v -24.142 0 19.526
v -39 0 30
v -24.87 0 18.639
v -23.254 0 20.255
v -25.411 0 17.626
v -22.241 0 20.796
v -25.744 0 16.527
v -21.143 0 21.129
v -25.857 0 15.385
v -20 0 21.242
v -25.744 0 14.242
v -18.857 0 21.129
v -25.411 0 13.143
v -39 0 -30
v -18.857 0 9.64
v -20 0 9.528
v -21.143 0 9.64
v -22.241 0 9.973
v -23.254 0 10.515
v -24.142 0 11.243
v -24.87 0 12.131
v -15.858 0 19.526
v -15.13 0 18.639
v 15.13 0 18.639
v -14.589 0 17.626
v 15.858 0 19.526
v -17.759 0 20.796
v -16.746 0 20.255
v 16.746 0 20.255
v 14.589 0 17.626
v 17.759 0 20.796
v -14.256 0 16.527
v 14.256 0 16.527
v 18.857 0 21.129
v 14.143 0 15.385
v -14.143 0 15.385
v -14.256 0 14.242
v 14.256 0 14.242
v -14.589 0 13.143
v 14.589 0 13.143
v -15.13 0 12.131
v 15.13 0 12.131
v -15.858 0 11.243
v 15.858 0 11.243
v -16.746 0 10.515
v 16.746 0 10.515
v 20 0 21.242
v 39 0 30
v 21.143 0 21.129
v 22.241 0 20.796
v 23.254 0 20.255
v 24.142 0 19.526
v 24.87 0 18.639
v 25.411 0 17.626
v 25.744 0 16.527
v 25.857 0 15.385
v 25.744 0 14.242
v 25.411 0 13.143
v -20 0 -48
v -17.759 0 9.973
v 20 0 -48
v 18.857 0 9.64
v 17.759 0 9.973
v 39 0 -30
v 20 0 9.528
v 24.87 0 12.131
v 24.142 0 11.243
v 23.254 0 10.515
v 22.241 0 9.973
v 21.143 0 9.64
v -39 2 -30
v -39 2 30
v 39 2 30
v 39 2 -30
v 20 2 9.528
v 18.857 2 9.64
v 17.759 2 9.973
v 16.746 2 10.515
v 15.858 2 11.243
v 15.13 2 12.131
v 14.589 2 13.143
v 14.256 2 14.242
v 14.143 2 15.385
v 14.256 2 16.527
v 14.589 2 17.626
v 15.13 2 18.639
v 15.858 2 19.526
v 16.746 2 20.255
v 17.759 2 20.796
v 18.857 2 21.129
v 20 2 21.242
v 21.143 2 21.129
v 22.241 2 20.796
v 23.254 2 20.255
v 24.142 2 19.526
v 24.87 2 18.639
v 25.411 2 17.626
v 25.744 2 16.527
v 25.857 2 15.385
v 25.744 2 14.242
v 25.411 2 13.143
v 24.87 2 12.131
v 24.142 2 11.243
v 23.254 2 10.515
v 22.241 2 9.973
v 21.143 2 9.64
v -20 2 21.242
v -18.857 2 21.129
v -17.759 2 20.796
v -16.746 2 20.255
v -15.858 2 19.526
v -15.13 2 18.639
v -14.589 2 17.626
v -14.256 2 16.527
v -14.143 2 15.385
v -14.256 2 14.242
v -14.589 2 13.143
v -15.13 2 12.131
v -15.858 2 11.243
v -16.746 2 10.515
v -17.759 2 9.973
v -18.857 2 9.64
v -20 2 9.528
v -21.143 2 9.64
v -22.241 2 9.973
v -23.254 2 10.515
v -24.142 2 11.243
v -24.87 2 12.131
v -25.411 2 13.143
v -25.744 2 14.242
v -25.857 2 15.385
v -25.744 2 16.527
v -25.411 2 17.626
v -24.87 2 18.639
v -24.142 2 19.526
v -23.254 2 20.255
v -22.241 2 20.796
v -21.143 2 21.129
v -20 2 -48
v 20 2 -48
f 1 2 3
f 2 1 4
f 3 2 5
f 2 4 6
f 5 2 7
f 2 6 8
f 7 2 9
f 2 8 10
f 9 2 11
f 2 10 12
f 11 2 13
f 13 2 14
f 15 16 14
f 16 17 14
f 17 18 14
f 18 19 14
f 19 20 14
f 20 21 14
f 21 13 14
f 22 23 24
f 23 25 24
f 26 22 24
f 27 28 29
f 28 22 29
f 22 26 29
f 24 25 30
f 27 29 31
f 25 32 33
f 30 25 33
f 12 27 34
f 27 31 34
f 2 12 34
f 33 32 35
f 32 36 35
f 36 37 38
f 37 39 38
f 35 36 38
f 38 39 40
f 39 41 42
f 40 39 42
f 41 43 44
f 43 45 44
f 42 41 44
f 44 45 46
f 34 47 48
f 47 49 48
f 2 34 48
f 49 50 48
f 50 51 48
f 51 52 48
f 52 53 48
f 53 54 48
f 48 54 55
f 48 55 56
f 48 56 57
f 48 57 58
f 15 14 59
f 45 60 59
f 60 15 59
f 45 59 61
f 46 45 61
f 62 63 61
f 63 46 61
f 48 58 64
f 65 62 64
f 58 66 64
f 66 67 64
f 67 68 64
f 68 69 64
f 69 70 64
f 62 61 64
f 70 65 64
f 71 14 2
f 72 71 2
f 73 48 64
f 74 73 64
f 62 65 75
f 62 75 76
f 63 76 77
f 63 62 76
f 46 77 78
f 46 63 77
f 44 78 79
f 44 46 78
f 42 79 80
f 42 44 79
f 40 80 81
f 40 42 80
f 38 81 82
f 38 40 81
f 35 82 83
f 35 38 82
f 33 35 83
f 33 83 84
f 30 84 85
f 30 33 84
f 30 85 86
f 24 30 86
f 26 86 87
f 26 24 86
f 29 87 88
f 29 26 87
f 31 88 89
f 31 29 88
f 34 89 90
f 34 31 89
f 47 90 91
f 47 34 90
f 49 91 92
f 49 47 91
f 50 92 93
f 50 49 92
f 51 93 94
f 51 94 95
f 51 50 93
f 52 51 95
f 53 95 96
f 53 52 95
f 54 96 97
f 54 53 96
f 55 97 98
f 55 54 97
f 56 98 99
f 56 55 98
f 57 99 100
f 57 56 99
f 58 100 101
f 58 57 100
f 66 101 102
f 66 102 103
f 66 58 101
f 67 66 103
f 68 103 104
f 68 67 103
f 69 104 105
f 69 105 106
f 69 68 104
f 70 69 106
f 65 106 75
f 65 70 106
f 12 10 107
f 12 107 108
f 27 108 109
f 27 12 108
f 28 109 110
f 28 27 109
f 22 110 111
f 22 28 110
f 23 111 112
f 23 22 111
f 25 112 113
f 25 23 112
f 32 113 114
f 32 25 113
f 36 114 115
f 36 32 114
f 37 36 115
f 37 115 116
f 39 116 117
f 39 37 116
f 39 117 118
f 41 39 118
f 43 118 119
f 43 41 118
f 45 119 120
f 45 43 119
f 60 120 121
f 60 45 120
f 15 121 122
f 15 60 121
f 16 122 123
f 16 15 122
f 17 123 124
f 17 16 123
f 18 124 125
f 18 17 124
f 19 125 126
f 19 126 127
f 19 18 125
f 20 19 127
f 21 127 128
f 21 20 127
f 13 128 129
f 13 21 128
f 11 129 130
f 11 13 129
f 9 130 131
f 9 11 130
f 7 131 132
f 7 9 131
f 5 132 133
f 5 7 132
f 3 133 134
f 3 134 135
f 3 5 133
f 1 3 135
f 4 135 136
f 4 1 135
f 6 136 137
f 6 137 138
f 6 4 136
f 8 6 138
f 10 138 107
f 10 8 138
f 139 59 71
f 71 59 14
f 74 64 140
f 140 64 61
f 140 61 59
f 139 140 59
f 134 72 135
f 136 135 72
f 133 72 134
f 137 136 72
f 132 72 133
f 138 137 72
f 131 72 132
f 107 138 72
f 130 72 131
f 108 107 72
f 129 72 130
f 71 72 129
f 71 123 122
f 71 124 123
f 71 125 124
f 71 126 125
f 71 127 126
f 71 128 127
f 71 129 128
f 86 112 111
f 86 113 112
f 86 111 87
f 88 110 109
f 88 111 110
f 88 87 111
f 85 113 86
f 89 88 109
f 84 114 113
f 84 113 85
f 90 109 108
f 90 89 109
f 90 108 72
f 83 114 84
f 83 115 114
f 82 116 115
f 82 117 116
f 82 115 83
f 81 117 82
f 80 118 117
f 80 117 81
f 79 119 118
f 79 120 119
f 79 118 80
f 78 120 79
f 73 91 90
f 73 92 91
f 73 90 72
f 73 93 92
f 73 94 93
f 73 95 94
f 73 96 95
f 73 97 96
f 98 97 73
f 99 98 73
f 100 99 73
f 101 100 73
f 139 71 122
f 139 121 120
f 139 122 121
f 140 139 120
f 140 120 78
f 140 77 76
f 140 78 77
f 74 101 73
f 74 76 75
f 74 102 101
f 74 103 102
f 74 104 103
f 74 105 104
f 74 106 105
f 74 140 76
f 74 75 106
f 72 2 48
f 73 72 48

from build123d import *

# Parameters (mm, degrees)
ESBO_O1_R                = 5.857023813
RESSALTO_EXTRUS_O1_DEPTH = 2


with BuildPart() as part:
    # Esboço1 → Ressalto-extrusão1 (new body)
    with BuildSketch(Plane(origin=(0, 0, 0), x_dir=(1, 0, 0), z_dir=(0, 1, 0))):
        Polygon((-20, 48), (-39, 30), (-39, -30), (39, -30), (39, 30), (20, 48), align=None)
        with Locations(Location((-20, -15.384615385, 0), (0, 0, 270))):
            Circle(ESBO_O1_R, mode=Mode.SUBTRACT)
        with Locations(Location((20, -15.384615385, 0), (0, 0, 90))):
            Circle(ESBO_O1_R, mode=Mode.SUBTRACT)
    extrude(amount=RESSALTO_EXTRUS_O1_DEPTH)


solid = part.part
